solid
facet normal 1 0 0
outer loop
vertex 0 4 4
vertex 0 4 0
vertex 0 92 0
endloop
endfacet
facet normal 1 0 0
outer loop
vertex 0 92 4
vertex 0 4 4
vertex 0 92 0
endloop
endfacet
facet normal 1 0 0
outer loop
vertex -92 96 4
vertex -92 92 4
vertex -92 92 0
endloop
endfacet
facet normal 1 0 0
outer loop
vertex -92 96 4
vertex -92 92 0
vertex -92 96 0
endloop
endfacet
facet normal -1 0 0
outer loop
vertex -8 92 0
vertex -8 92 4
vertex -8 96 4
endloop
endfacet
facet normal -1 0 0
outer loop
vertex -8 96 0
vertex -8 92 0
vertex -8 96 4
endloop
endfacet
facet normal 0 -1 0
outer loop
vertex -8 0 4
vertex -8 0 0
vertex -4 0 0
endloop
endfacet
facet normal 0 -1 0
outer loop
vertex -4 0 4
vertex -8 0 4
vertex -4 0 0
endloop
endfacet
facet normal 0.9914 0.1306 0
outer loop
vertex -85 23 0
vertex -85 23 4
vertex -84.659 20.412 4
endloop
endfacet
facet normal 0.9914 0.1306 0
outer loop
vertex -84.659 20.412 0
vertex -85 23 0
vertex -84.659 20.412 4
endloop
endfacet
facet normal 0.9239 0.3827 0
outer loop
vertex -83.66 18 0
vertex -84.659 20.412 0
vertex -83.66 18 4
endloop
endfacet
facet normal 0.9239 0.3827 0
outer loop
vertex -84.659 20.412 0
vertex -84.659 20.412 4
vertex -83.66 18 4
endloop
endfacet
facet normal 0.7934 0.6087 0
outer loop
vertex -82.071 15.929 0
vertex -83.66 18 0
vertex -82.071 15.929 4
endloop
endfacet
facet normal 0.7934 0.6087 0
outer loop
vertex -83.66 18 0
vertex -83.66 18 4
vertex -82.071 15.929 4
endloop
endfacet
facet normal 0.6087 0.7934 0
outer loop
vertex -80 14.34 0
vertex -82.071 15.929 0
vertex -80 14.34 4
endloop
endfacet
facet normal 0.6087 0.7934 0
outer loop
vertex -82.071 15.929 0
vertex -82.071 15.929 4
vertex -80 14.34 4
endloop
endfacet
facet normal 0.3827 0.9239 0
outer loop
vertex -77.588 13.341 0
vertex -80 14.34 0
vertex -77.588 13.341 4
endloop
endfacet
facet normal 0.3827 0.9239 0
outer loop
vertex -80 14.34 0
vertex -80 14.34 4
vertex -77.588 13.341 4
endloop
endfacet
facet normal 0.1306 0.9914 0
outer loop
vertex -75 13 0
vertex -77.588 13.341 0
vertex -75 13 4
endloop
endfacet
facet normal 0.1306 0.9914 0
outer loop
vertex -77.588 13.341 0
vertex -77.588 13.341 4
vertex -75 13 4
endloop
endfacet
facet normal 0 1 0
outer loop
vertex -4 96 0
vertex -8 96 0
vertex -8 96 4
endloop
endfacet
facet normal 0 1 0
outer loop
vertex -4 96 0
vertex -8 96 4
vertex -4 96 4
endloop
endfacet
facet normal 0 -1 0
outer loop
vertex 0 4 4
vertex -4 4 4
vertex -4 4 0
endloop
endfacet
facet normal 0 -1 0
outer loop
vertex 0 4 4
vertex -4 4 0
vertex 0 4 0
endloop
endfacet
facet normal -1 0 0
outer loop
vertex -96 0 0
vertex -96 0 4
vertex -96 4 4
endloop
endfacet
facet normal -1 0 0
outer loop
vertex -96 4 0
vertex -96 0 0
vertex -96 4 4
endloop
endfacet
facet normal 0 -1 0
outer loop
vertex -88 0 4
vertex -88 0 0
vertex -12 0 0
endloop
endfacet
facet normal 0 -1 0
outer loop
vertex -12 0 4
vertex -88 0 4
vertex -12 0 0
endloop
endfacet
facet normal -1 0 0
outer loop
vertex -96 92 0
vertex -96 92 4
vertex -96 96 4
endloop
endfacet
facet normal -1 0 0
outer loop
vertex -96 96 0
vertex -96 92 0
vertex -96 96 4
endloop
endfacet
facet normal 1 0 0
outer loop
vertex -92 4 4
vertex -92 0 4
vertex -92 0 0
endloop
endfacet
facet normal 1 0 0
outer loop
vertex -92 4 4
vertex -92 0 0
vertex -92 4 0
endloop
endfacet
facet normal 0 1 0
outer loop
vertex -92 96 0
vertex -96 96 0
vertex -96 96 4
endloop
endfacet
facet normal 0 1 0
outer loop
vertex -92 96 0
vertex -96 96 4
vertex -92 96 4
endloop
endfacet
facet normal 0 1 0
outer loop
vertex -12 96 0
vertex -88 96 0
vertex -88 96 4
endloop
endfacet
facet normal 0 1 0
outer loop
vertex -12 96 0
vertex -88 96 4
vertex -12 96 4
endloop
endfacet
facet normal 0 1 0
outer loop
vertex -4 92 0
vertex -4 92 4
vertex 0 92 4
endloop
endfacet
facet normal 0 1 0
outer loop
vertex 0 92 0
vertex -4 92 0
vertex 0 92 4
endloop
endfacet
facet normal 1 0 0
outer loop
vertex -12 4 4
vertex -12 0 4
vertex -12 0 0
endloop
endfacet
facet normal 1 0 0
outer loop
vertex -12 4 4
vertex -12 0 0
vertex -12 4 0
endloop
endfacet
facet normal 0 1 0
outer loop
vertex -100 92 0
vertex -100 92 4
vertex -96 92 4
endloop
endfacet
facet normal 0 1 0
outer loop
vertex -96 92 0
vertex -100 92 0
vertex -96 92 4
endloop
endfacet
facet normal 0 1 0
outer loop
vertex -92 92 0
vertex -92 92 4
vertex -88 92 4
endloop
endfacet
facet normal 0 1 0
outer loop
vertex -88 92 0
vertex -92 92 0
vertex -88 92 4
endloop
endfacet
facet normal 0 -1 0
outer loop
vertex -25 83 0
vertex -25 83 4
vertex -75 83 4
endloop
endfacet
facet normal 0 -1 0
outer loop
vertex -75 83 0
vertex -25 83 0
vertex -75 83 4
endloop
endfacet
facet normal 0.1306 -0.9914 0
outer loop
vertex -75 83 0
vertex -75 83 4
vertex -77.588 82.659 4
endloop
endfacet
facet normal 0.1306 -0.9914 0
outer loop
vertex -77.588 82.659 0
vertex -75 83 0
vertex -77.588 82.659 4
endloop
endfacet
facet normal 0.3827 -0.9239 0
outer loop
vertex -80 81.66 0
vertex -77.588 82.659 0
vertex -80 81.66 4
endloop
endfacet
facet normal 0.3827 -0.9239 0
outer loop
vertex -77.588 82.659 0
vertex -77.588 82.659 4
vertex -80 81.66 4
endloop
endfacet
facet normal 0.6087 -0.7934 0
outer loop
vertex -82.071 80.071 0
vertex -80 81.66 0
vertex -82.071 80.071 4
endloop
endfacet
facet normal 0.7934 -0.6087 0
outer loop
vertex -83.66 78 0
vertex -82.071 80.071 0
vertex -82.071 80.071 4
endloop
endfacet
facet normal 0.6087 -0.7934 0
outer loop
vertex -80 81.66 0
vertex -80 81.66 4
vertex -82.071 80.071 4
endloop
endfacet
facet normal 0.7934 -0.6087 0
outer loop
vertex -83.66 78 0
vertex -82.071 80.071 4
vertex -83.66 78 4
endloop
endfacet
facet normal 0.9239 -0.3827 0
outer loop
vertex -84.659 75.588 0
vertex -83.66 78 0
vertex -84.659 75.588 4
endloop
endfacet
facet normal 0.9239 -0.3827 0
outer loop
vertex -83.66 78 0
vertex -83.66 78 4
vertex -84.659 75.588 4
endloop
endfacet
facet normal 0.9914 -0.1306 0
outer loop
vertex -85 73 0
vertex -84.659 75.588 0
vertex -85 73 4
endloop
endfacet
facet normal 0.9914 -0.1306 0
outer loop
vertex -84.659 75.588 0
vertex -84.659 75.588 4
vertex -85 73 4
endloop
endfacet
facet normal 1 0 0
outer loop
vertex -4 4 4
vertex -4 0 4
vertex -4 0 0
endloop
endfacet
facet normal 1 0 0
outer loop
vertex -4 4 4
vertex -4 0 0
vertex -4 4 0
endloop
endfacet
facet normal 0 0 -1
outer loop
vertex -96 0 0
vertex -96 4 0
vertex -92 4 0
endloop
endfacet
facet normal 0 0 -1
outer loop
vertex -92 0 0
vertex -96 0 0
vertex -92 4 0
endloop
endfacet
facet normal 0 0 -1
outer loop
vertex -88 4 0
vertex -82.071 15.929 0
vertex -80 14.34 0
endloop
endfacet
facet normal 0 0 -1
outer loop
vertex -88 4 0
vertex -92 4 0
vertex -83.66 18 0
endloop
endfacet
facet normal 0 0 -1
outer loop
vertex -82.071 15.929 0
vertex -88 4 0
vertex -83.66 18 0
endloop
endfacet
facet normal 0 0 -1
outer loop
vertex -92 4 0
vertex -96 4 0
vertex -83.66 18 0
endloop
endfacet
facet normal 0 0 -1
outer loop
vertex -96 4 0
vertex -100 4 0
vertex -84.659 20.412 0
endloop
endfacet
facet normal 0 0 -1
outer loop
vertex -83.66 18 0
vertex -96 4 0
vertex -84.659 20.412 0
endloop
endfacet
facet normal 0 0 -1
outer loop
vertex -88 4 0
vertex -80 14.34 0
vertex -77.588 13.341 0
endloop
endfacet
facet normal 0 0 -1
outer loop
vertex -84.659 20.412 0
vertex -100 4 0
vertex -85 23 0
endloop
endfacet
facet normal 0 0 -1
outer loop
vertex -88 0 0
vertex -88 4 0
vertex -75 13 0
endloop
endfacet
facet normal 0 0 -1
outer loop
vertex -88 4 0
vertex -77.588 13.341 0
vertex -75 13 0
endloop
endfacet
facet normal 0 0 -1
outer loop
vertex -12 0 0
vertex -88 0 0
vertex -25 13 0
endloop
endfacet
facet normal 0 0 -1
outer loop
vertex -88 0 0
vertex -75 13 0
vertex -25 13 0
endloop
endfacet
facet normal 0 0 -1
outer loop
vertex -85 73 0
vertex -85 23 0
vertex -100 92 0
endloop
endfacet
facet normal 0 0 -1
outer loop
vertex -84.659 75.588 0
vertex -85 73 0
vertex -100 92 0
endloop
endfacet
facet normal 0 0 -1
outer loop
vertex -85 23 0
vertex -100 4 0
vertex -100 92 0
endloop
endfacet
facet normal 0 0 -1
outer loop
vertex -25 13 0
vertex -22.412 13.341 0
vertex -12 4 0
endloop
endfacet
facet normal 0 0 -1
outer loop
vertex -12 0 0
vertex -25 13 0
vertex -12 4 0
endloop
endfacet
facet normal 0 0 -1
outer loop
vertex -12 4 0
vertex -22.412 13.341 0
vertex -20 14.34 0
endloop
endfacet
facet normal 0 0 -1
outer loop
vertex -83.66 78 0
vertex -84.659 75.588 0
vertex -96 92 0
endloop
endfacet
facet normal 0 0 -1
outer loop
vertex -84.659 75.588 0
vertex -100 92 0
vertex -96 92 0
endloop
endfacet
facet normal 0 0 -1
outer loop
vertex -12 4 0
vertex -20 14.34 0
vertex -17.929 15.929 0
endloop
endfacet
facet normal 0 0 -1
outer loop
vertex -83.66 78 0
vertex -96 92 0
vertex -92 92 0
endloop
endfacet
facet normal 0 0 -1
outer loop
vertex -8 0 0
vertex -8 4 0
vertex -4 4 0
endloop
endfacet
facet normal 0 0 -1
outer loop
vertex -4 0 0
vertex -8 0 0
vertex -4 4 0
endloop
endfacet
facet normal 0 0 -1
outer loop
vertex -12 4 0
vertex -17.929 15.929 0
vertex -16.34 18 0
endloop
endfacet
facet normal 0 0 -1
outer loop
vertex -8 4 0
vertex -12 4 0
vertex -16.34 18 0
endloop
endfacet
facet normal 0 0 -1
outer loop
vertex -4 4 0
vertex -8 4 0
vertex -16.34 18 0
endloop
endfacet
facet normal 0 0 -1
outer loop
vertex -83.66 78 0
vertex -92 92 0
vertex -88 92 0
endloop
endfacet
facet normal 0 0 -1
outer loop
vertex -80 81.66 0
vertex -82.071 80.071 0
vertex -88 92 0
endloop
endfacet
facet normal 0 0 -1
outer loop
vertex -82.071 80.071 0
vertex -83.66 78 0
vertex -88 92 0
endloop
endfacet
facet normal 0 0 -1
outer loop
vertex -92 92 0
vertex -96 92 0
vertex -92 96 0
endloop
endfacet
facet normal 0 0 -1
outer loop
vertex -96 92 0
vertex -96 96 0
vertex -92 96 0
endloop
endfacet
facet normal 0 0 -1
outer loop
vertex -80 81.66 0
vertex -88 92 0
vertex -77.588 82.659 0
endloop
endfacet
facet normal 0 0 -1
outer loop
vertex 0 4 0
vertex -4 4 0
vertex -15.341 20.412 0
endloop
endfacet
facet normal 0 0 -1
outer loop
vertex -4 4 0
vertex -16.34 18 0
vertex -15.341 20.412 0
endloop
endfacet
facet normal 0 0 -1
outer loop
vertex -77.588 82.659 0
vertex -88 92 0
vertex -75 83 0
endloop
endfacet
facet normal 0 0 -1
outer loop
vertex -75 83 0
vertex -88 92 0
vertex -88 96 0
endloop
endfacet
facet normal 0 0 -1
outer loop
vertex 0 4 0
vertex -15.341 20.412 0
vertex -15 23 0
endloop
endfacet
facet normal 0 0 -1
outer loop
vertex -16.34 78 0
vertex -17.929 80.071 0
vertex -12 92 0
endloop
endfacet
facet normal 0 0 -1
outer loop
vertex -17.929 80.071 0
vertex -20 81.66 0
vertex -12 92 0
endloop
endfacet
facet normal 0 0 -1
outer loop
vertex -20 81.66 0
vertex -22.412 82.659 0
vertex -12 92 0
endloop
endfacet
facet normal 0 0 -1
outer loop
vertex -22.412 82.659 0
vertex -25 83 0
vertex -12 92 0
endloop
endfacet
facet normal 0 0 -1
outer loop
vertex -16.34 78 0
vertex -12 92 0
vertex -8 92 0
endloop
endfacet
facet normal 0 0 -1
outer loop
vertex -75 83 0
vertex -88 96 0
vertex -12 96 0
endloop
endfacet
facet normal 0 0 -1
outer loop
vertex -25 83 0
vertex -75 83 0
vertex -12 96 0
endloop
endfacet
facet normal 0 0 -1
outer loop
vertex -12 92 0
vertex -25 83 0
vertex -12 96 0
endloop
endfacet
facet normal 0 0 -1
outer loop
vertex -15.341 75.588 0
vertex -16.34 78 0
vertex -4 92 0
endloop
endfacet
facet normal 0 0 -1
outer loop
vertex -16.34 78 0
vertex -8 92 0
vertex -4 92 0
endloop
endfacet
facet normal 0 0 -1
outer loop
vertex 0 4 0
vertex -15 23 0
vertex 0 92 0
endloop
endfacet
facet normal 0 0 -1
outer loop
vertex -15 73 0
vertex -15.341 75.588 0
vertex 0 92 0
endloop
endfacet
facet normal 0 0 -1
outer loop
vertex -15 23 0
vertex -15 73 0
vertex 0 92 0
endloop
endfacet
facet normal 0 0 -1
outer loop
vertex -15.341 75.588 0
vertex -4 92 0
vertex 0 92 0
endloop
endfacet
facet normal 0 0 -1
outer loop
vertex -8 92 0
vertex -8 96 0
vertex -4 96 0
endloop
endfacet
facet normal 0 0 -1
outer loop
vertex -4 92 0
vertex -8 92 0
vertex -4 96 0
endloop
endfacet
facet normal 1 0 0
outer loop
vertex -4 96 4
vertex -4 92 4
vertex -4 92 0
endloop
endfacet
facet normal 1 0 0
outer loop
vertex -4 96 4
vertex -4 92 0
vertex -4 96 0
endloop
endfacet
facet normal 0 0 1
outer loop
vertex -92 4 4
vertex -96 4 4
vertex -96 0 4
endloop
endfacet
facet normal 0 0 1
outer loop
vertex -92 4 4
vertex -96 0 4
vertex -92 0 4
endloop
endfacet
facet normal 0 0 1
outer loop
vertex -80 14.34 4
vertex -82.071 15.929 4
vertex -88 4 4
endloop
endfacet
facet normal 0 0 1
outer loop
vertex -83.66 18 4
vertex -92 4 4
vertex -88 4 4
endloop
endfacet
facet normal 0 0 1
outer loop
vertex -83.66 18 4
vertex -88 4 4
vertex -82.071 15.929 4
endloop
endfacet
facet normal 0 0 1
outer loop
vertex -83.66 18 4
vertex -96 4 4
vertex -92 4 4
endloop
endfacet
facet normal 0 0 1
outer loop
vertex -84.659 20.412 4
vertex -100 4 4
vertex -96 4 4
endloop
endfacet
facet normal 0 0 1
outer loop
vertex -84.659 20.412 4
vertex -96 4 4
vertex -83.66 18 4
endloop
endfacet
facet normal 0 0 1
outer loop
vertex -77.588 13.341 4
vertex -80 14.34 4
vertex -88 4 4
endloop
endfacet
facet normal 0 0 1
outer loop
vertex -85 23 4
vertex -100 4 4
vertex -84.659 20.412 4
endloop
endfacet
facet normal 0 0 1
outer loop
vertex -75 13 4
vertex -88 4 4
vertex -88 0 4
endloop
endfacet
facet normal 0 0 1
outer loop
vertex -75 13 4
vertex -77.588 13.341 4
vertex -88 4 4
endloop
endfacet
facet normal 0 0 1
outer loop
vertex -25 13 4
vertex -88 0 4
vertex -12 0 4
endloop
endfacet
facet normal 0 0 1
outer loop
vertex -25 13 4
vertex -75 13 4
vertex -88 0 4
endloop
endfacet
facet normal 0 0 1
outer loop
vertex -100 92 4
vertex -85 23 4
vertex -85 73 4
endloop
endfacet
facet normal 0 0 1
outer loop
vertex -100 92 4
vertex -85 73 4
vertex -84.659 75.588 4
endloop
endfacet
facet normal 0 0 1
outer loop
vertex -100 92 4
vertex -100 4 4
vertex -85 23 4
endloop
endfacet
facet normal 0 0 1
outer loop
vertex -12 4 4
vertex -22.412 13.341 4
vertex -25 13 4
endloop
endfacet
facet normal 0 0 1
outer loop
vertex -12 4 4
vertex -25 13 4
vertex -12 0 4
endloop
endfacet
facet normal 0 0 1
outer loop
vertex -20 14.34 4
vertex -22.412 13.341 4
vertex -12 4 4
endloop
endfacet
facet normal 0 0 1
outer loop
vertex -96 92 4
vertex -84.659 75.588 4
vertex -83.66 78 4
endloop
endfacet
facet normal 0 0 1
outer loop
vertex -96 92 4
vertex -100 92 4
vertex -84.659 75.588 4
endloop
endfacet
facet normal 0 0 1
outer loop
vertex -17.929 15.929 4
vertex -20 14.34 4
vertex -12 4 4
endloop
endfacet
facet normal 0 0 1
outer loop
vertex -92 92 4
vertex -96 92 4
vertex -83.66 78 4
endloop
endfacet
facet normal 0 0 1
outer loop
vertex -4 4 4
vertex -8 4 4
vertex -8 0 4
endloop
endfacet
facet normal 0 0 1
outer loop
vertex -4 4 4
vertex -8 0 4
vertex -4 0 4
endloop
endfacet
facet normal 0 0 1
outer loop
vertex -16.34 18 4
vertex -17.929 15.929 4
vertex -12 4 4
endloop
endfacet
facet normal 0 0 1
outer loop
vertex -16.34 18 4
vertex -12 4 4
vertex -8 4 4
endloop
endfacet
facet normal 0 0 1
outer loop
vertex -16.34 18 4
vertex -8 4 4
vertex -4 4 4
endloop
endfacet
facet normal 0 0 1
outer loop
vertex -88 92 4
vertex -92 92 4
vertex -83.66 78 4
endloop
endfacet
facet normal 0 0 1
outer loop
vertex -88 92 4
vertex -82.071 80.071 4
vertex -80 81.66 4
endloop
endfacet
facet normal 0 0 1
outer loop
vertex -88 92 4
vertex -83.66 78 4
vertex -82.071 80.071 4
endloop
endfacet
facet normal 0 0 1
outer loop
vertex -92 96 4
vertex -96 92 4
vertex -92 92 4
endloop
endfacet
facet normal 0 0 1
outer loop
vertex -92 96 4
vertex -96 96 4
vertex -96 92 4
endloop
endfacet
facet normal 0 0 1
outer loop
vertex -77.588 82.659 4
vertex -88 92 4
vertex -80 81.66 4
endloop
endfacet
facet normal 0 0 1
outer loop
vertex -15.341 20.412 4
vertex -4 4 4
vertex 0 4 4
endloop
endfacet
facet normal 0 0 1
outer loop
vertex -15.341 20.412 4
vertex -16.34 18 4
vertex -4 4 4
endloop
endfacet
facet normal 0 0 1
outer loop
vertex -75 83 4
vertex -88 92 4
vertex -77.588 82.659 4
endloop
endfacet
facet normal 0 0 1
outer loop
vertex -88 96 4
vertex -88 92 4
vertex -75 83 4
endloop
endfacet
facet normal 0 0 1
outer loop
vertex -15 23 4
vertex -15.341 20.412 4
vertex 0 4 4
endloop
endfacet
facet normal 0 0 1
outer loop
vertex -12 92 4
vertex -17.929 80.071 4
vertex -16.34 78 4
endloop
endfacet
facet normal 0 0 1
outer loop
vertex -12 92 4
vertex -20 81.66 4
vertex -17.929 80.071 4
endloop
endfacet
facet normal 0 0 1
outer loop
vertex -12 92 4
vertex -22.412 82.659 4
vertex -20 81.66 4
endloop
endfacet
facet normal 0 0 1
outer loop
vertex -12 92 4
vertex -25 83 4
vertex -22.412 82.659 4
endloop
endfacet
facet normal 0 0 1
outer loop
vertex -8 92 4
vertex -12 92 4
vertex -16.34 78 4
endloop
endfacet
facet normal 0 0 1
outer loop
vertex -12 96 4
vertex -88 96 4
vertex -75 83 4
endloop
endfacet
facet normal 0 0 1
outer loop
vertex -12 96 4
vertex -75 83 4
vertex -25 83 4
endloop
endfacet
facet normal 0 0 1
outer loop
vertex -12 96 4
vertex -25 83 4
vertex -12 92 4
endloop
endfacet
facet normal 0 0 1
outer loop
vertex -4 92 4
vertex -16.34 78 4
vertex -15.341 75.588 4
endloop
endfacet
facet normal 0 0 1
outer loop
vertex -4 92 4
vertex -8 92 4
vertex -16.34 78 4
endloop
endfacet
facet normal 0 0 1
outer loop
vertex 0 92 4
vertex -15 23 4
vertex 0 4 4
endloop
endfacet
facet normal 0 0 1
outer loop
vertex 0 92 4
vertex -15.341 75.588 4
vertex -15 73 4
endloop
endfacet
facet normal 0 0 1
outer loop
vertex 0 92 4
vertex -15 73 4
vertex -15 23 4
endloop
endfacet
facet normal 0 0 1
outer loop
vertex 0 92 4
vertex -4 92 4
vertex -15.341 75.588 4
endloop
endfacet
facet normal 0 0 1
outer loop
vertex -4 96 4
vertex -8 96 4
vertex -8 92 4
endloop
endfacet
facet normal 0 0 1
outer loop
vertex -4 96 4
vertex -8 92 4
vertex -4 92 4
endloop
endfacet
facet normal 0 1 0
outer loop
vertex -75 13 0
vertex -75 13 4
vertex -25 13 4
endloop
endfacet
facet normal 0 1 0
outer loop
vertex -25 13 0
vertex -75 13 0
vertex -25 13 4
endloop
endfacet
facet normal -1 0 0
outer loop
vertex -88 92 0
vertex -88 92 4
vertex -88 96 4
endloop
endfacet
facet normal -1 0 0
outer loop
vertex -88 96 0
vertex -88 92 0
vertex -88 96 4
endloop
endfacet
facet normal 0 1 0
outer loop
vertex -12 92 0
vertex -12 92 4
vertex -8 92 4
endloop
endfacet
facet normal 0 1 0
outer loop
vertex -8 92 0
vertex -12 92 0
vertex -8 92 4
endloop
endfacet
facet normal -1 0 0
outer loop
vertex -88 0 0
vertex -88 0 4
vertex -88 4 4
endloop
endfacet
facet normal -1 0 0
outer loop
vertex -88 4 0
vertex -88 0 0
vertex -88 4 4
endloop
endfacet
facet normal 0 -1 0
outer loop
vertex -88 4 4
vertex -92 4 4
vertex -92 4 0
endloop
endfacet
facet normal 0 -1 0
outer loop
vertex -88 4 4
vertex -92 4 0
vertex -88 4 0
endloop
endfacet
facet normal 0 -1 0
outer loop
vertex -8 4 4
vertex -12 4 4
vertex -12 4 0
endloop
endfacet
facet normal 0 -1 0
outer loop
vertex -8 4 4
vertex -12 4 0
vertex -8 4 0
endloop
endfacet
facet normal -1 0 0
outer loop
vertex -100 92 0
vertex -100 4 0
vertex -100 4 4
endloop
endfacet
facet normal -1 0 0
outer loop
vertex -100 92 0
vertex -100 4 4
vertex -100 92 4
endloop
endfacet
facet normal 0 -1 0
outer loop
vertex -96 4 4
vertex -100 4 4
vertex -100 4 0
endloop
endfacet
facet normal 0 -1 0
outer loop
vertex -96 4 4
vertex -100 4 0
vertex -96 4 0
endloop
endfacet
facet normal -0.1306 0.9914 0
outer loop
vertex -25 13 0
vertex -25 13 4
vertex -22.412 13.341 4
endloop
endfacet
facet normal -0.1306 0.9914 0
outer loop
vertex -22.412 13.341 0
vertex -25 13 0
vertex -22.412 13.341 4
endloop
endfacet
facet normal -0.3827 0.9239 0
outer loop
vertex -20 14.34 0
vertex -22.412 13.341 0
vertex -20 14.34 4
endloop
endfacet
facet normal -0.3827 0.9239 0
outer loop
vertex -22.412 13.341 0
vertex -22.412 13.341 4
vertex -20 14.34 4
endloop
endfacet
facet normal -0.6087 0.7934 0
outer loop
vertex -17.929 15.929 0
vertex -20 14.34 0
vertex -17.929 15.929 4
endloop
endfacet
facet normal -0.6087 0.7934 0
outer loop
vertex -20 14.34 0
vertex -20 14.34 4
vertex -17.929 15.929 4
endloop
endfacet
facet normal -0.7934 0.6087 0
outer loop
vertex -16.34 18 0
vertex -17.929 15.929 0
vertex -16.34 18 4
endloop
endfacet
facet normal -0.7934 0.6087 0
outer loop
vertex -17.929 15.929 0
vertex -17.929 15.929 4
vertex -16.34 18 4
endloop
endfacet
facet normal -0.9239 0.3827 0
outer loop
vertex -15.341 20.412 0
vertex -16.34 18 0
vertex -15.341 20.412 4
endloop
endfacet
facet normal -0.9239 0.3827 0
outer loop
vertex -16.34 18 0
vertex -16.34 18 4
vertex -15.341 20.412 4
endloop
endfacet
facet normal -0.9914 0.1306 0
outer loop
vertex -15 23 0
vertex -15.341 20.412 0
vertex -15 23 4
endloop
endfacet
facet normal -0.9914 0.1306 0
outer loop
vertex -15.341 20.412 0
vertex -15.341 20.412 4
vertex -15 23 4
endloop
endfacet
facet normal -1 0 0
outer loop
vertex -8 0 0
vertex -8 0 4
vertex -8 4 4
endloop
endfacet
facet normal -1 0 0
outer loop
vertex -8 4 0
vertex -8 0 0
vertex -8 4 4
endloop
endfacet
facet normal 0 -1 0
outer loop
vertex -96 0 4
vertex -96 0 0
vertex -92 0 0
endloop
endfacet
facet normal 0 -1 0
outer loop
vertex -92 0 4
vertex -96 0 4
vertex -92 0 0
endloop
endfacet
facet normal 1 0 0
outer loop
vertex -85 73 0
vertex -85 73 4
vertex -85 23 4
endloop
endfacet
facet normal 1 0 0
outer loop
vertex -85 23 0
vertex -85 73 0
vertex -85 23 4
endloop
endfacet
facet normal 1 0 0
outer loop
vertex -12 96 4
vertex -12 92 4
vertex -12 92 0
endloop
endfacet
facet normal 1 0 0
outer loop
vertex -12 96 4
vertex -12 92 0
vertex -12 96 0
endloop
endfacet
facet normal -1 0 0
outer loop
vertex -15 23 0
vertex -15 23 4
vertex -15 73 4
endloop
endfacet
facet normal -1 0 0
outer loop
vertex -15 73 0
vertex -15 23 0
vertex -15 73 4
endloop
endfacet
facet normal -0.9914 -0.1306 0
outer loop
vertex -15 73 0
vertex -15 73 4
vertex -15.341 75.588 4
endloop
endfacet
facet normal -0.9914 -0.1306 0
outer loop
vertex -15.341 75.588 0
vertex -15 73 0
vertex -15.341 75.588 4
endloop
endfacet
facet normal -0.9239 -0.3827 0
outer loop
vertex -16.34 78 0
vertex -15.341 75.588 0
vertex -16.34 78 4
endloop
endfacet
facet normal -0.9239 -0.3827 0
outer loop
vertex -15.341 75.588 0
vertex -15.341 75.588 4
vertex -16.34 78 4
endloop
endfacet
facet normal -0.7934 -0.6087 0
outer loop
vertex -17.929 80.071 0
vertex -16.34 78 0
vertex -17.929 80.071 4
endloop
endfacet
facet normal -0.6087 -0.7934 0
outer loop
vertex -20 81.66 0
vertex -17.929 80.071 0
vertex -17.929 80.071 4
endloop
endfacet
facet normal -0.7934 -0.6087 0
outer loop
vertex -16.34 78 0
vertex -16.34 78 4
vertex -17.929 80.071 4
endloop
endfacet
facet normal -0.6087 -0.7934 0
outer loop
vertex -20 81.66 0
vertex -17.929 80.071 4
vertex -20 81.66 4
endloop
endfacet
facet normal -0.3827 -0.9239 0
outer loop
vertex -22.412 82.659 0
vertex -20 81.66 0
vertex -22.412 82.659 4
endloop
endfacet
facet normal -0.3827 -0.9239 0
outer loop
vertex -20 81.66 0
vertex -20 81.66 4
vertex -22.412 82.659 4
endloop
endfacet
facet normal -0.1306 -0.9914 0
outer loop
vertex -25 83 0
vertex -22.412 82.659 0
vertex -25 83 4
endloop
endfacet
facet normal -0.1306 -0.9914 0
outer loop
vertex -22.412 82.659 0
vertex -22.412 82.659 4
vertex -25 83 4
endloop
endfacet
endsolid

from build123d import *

# Parameters (mm, degrees)
F0_W     = 100
F0_H     = 96
F1_DEPTH = 4
F2_W     = 4
F2_H     = 4
F3_DEPTH = 4
F5_DEPTH = 4


with BuildPart() as f1:
    # F0 (on Top) → F1 (new body)
    with BuildSketch(Plane.XY):
        with Locations((-50, 48)):
            Rectangle(F0_W, F0_H)
    extrude(amount=F1_DEPTH)

    # F2 (on face) → F3 (cut, through all)
    with BuildSketch(Plane.XY.offset(4)):
        with Locations((-2, 2)):
            Rectangle(F2_W, F2_H)
        with Locations((-10, 2)):
            Rectangle(F2_W, F2_H)
        with Locations((-2, 94)):
            Rectangle(F2_W, F2_H)
        with Locations((-10, 94)):
            Rectangle(F2_W, F2_H)
        with Locations((-98, 94)):
            Rectangle(F2_W, F2_H)
        with Locations((-90, 2)):
            Rectangle(F2_W, F2_H)
        with Locations((-98, 2)):
            Rectangle(F2_W, F2_H)
        with Locations((-90, 94)):
            Rectangle(F2_W, F2_H)
    extrude(amount=-F3_DEPTH, mode=Mode.SUBTRACT)

    # F4 (on face) → F5 (cut, through all)
    with BuildSketch(Plane.XY.offset(4)):
        with BuildLine():
            ThreePointArc((-85, 23), (-82.071068, 15.928932), (-75, 13))
            Line((-75, 13), (-25, 13))
            ThreePointArc((-25, 13), (-17.928932, 15.928932), (-15, 23))
            Line((-15, 23), (-15, 73))
            ThreePointArc((-15, 73), (-17.928932, 80.071068), (-25, 83))
            Line((-25, 83), (-75, 83))
            ThreePointArc((-75, 83), (-82.071068, 80.071068), (-85, 73))
            Line((-85, 73), (-85, 23))
        make_face()
    extrude(amount=-F5_DEPTH, mode=Mode.SUBTRACT)


solid = f1.part
